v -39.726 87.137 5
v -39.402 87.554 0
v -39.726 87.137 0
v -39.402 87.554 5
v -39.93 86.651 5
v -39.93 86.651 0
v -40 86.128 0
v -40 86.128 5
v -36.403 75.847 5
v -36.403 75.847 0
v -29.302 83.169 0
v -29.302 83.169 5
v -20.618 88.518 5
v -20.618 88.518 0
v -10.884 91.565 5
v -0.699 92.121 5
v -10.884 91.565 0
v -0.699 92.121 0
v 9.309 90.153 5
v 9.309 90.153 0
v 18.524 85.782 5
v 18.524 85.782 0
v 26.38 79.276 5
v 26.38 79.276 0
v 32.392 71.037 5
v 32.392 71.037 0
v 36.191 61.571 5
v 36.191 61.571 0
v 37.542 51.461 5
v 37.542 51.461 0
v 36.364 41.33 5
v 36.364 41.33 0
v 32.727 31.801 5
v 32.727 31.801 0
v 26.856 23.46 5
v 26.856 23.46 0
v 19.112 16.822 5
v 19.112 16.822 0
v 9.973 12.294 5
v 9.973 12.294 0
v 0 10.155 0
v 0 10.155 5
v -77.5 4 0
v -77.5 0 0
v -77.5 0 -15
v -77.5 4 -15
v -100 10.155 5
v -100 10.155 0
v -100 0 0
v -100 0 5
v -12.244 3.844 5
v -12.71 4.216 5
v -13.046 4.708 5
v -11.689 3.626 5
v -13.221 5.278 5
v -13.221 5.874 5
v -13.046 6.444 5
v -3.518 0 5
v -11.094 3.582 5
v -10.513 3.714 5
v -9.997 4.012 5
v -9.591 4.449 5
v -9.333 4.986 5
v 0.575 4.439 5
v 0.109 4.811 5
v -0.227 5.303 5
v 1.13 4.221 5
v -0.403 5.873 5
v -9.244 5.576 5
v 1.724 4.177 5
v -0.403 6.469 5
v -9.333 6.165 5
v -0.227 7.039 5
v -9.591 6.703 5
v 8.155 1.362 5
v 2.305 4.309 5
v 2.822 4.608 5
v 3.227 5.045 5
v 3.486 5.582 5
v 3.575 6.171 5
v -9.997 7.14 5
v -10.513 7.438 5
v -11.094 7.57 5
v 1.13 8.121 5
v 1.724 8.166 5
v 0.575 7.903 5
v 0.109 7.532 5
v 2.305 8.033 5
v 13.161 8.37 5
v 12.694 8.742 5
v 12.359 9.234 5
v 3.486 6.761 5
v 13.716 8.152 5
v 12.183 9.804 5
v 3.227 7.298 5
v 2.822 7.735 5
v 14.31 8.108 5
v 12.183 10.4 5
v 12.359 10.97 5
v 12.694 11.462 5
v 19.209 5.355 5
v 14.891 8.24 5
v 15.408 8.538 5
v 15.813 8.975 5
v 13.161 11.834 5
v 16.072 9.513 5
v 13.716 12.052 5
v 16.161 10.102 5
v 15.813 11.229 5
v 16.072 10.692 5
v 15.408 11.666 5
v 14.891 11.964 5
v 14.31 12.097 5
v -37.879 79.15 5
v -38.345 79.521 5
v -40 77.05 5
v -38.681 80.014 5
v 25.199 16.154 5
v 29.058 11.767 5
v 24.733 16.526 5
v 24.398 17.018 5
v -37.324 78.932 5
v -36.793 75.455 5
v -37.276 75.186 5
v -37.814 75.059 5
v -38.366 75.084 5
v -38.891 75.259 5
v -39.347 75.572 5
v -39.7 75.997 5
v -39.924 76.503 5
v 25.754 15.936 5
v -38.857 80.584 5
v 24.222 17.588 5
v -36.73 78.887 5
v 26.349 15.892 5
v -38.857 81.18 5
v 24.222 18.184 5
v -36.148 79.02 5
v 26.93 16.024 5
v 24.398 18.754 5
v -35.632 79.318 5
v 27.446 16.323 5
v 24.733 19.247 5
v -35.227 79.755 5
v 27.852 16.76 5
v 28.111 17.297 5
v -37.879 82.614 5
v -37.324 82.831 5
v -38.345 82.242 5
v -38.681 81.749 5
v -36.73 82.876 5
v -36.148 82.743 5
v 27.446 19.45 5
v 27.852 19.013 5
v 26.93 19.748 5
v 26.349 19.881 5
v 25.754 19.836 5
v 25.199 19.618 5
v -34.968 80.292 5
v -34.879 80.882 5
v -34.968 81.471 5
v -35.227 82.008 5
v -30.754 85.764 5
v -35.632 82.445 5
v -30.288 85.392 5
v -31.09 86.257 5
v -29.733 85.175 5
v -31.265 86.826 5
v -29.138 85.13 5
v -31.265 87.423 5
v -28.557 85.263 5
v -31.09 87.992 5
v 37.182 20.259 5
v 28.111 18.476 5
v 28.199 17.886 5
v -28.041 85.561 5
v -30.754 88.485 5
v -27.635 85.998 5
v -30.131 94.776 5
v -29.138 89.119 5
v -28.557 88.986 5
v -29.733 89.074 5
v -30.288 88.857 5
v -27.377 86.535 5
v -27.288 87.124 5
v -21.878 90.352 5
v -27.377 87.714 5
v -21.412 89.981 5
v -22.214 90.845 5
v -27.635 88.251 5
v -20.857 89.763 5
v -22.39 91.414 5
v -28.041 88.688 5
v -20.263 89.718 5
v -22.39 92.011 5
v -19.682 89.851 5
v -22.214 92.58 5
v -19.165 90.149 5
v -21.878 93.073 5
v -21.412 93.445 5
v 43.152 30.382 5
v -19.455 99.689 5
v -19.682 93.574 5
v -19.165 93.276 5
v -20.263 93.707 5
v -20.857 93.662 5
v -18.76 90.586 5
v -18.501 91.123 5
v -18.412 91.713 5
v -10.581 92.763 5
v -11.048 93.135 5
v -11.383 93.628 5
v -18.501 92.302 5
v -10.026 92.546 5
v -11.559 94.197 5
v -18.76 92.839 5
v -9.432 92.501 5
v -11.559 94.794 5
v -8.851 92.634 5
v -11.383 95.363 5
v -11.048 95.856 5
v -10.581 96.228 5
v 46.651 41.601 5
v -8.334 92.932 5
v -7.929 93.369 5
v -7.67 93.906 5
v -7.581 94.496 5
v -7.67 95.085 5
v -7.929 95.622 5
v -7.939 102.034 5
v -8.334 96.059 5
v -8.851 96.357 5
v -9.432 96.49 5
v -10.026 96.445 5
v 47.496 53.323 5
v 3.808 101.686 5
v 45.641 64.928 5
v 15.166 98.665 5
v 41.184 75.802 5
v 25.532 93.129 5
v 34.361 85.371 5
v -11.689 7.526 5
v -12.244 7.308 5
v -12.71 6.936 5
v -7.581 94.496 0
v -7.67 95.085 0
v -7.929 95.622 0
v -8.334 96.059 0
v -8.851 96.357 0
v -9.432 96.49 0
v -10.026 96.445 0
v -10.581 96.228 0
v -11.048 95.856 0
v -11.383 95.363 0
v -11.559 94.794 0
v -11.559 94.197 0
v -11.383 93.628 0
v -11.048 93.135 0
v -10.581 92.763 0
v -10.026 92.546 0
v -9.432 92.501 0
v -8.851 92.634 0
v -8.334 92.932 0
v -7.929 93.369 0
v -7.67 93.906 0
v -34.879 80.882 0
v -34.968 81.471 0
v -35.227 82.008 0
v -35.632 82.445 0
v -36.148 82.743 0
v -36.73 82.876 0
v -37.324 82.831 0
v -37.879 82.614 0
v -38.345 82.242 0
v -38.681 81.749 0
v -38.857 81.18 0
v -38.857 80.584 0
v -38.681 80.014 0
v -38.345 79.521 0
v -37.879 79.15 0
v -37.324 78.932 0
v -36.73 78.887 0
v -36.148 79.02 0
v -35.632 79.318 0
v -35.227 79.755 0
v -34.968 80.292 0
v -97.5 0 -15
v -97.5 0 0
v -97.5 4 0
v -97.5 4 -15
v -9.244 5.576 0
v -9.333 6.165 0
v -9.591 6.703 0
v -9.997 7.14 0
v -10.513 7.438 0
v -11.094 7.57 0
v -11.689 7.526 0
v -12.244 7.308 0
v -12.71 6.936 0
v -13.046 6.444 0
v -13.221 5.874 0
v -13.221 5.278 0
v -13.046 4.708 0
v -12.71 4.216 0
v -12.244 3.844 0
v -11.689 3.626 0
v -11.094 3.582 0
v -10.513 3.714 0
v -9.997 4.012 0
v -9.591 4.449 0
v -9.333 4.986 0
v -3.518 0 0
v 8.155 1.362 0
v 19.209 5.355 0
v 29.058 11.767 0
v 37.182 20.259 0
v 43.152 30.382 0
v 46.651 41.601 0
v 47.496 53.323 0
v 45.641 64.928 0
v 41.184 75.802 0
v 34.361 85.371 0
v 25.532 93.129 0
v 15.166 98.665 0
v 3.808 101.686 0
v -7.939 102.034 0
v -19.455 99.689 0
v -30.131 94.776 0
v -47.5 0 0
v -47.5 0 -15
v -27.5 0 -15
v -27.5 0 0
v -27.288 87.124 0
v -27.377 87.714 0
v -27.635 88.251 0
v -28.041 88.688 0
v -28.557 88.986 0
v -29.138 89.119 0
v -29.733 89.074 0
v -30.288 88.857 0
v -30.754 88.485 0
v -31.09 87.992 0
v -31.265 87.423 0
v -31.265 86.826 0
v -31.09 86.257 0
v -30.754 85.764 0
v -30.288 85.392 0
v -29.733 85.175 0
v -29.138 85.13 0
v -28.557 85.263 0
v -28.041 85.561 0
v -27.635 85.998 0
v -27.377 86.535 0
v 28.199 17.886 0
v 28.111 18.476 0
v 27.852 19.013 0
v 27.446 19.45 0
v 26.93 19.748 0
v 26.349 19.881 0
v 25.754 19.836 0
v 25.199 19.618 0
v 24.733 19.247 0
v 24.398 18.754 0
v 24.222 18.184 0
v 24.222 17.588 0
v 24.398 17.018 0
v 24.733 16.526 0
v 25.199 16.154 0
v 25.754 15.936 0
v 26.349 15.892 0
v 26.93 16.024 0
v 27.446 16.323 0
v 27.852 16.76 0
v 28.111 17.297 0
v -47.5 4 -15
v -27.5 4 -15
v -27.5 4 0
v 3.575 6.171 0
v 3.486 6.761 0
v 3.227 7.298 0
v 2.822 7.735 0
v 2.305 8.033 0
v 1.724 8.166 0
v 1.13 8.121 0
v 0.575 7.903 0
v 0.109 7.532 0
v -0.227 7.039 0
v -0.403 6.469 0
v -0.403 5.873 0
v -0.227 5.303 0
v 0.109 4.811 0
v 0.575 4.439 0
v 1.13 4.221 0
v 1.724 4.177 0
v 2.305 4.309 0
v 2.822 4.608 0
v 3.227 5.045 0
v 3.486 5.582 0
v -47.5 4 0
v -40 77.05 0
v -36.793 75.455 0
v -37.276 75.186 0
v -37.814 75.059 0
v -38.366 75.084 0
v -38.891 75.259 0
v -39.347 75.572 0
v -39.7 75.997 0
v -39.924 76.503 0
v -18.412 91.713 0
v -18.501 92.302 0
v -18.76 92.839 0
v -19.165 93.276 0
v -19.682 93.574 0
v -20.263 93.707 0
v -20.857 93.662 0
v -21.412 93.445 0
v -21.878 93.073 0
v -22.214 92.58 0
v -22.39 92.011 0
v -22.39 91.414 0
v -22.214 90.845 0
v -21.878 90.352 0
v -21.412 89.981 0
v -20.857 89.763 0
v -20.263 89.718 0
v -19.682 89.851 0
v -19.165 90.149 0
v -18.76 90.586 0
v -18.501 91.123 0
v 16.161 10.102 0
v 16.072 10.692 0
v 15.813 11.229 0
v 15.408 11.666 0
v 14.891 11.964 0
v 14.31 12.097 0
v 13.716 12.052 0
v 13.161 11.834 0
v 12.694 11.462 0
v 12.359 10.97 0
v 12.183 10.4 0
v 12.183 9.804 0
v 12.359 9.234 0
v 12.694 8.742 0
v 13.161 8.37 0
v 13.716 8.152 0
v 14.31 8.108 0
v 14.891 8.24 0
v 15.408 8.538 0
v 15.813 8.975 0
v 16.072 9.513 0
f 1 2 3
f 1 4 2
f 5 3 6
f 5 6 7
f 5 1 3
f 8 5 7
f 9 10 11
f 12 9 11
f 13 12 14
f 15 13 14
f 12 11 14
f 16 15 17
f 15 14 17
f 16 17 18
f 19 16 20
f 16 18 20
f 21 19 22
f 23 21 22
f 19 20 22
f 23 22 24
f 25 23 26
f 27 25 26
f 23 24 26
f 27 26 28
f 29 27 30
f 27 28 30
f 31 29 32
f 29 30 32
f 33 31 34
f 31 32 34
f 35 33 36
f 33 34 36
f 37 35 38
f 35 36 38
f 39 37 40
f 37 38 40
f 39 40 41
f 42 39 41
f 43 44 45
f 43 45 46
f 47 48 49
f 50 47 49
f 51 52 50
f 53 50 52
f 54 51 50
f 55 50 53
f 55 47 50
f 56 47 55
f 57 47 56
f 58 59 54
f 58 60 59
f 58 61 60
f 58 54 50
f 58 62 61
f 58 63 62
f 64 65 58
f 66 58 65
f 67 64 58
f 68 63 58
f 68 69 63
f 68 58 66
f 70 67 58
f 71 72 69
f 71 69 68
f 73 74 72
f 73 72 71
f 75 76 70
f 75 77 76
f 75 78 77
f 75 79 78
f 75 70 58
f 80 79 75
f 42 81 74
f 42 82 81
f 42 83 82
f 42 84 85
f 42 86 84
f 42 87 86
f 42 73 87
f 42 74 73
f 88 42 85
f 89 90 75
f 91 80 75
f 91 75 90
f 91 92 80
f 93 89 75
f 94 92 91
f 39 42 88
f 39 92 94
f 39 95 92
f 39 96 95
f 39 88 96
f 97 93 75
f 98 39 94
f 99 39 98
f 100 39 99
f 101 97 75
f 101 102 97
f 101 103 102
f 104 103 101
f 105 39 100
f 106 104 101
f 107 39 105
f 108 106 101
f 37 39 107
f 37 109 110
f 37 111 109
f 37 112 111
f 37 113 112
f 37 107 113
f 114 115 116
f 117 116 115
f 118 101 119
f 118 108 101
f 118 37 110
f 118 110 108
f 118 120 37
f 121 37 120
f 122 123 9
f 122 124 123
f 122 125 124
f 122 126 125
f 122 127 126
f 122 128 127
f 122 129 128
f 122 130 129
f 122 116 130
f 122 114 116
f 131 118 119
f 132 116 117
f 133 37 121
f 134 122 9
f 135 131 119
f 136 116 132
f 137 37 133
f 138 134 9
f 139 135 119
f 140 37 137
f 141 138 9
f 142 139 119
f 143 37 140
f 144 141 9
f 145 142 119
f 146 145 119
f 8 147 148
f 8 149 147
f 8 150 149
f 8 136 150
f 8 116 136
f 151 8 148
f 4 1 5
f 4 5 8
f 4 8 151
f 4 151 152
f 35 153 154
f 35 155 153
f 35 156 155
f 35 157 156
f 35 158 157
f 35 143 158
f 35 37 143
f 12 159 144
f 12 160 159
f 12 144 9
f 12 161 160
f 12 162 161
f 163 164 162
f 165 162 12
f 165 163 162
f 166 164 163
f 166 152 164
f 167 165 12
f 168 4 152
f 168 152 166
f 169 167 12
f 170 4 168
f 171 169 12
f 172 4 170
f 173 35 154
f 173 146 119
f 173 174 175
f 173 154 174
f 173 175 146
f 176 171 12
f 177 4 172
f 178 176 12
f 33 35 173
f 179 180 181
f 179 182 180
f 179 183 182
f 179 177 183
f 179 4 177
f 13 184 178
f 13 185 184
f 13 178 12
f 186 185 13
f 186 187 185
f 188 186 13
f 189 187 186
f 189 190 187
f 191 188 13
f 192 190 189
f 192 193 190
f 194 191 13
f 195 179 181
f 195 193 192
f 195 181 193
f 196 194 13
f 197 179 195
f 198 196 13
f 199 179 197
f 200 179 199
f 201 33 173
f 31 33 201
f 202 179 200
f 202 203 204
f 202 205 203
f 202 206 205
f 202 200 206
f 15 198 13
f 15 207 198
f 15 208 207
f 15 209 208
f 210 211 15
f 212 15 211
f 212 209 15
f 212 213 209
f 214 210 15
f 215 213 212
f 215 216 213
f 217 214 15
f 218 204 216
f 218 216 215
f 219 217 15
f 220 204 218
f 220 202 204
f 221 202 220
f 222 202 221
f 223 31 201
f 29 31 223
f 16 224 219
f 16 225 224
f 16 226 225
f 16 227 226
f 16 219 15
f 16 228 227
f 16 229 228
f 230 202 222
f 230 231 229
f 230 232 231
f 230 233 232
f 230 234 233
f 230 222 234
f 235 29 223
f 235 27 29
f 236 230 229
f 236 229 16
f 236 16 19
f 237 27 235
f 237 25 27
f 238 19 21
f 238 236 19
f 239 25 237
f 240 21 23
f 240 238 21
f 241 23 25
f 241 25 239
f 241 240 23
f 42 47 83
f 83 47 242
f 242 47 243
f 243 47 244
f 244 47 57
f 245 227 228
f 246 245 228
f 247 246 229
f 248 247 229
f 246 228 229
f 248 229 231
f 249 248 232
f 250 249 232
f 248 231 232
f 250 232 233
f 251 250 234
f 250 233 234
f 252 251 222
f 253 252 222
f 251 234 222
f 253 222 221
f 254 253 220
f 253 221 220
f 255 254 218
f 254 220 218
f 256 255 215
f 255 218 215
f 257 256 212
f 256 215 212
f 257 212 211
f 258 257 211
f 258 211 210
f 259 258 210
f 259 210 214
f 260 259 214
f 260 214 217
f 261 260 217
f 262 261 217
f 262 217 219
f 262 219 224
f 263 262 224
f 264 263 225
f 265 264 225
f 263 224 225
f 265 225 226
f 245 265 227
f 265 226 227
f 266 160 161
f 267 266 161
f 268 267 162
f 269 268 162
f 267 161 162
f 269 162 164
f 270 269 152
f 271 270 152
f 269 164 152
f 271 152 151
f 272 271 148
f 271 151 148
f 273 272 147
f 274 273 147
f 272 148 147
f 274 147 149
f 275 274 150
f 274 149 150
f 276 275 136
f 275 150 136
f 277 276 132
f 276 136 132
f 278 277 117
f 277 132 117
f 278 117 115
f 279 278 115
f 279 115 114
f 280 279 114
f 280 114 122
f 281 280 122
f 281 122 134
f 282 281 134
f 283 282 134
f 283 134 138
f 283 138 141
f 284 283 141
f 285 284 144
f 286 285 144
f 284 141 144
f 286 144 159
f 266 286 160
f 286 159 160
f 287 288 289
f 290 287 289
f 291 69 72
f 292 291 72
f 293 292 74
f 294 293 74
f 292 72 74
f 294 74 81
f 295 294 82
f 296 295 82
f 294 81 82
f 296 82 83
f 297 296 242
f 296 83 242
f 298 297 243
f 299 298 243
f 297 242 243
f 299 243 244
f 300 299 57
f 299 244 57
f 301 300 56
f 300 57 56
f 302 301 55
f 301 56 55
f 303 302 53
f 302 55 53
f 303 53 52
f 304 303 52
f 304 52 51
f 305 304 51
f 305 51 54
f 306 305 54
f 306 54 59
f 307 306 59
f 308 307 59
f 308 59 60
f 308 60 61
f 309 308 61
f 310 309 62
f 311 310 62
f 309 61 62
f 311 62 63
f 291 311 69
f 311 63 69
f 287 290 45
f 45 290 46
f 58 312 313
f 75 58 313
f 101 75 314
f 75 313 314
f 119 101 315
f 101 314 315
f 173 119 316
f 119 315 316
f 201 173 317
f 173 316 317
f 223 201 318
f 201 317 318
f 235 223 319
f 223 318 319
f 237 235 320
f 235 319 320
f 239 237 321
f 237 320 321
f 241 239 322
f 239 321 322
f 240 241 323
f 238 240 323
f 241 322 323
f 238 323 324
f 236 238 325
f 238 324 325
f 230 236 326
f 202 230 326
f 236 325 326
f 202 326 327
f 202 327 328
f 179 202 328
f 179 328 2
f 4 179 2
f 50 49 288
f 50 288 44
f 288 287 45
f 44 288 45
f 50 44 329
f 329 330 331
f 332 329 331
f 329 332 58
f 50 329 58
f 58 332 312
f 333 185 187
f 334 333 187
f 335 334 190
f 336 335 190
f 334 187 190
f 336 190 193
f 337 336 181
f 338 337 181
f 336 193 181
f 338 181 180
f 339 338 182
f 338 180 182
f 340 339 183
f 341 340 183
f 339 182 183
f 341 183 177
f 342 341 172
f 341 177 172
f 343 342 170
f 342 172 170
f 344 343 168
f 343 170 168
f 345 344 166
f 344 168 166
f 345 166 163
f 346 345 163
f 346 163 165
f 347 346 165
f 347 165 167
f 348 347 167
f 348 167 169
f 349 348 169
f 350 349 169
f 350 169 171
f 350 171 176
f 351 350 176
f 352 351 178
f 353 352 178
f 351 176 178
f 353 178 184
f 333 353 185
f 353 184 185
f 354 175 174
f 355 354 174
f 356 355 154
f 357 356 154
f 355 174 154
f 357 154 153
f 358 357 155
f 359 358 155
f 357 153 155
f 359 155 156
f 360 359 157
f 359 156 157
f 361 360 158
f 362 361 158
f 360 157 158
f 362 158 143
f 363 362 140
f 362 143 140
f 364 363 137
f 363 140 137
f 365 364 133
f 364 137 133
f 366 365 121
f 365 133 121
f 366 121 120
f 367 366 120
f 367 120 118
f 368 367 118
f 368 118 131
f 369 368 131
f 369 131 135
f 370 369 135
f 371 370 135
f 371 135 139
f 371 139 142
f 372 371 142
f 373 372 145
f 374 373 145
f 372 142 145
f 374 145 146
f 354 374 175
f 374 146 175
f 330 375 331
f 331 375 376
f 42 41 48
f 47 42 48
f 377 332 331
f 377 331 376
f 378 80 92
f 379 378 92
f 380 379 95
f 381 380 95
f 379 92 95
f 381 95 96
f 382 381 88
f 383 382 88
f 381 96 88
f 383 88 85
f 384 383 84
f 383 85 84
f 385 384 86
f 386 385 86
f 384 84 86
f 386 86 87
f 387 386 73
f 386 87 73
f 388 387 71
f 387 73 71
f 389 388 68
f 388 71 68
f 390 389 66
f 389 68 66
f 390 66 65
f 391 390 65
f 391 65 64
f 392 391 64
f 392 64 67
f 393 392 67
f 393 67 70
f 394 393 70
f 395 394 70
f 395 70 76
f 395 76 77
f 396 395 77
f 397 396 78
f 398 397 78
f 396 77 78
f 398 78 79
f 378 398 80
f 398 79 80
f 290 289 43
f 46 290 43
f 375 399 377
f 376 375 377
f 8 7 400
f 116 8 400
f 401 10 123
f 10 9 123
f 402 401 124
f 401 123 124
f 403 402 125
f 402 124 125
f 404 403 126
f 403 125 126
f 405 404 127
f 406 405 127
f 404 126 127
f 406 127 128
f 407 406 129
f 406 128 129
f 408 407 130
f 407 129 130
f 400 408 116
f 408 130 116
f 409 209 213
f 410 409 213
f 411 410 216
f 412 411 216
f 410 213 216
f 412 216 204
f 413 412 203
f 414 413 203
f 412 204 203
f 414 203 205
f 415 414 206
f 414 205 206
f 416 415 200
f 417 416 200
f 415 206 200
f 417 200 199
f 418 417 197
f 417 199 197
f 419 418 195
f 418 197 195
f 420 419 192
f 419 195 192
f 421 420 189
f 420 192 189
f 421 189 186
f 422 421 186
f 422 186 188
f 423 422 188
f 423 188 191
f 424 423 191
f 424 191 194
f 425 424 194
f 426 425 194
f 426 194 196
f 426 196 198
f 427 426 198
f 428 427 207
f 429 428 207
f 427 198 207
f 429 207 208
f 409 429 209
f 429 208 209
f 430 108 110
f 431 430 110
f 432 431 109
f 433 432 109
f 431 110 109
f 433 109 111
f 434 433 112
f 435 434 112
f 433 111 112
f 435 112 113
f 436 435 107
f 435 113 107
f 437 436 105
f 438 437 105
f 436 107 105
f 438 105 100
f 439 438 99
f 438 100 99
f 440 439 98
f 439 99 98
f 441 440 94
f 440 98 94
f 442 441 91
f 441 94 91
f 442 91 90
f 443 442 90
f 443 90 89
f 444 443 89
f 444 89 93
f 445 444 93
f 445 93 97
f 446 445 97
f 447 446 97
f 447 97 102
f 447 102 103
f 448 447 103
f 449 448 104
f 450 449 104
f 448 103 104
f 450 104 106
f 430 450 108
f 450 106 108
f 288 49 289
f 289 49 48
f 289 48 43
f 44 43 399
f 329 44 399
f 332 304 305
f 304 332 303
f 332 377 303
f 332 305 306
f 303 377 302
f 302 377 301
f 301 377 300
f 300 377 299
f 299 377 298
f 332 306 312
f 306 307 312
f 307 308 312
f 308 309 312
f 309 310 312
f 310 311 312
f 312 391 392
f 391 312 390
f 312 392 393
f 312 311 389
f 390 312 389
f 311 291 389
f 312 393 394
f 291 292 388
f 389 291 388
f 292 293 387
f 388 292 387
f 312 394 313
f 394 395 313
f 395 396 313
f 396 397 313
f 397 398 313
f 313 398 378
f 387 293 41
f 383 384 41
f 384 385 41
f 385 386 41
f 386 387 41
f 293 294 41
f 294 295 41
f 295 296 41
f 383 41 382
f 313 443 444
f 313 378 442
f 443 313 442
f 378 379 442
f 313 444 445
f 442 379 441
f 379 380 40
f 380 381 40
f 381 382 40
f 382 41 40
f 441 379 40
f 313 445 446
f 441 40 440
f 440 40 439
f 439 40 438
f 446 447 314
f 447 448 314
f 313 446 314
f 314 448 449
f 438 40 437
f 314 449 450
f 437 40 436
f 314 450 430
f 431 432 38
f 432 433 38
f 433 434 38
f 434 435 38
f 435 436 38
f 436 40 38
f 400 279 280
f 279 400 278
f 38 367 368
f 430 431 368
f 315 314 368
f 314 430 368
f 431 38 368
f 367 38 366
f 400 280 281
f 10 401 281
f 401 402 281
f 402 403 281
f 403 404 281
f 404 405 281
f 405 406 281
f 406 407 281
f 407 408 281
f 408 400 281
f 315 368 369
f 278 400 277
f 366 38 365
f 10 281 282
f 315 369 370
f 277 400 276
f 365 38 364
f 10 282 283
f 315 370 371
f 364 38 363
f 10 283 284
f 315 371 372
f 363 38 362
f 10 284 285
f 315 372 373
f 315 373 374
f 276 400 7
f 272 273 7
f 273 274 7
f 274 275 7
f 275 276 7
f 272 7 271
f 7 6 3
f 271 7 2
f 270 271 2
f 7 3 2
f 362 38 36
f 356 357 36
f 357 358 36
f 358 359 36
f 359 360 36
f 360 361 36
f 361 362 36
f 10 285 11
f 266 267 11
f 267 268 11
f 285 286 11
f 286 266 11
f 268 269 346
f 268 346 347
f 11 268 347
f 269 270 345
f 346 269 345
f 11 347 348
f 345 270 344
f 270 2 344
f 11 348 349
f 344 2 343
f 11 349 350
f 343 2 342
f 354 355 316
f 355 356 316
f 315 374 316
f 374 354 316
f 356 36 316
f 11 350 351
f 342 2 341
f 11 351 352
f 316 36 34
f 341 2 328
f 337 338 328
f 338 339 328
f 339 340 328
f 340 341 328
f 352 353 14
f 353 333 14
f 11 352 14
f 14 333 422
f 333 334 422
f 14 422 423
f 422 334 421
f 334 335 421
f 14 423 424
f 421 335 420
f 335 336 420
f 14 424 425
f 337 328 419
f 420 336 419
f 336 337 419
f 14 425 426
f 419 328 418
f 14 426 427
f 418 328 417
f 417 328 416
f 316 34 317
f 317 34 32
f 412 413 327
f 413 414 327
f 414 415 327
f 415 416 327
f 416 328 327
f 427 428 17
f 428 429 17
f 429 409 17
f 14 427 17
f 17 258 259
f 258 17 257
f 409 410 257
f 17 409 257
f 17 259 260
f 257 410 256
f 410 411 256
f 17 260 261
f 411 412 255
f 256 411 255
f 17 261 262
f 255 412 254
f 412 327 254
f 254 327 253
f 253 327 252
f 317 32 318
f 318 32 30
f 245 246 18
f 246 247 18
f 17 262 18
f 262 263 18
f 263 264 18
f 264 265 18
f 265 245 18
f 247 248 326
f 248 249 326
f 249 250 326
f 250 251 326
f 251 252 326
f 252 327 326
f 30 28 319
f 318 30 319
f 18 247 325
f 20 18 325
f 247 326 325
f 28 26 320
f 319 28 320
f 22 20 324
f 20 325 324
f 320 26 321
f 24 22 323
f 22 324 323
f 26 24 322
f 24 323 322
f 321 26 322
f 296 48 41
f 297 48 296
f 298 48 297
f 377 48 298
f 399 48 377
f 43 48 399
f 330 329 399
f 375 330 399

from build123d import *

# Parameters (mm, degrees)
F1_DEPTH = 5
F2_R     = 2
F3_R     = 2
F4_DEPTH = 5
F5_W     = 20
F5_H     = 4
F6_DEPTH = 20


with BuildPart() as f1:
    # F0 (on Top) → F1 (new body)
    with BuildSketch(Plane.XY):
        with BuildLine():
            ThreePointArc((-40, 70.154987), (30.639398, 73.914586), (0, 10.154987))
            Line((0, 10.154987), (-100, 10.154987))
            Line((-100, 10.154987), (-100, 0))
            Line((-100, 0), (-3.517851, 0))
            ThreePointArc((-3.517851, 0), (43.563989, 70.884062), (-40, 86.956077))
            Line((-40, 86.956077), (-40, 70.154987))
        make_face()
    extrude(amount=F1_DEPTH)

    # F2
    f2_edges = [f1.edges().sort_by_distance(p)[0] for p in [
        (-40, 70.154987, 2.5),
        (-40, 86.956077, 2.5),
    ]]
    fillet(f2_edges, radius=F2_R)

    # F3 (on face) → F4 (cut)
    with BuildSketch(Plane.XY.offset(5)):
        with Locations((-36.878993, 80.881587)):
            Circle(F3_R)
        with Locations((-20.412356, 91.712579)):
            Circle(F3_R)
        with Locations((-9.581419, 94.495535)):
            Circle(F3_R)
        with Locations((-29.287707, 87.124474)):
            Circle(F3_R)
        with Locations((-11.243654, 5.575917)):
            Circle(F3_R)
        with Locations((14.160543, 10.102125)):
            Circle(F3_R)
        with Locations((26.199445, 17.886208)):
            Circle(F3_R)
        with Locations((1.5747, 6.171187)):
            Circle(F3_R)
    extrude(amount=-F4_DEPTH, mode=Mode.SUBTRACT)

    # F5 (on face) → F6 (join)
    with BuildSketch(Plane.XY.offset(5)):
        with Locations((-37.5, 2)):
            Rectangle(F5_W, F5_H)
        with Locations((-87.5, 2)):
            Rectangle(F5_W, F5_H)
    extrude(amount=-F6_DEPTH)


solid = f1.part
